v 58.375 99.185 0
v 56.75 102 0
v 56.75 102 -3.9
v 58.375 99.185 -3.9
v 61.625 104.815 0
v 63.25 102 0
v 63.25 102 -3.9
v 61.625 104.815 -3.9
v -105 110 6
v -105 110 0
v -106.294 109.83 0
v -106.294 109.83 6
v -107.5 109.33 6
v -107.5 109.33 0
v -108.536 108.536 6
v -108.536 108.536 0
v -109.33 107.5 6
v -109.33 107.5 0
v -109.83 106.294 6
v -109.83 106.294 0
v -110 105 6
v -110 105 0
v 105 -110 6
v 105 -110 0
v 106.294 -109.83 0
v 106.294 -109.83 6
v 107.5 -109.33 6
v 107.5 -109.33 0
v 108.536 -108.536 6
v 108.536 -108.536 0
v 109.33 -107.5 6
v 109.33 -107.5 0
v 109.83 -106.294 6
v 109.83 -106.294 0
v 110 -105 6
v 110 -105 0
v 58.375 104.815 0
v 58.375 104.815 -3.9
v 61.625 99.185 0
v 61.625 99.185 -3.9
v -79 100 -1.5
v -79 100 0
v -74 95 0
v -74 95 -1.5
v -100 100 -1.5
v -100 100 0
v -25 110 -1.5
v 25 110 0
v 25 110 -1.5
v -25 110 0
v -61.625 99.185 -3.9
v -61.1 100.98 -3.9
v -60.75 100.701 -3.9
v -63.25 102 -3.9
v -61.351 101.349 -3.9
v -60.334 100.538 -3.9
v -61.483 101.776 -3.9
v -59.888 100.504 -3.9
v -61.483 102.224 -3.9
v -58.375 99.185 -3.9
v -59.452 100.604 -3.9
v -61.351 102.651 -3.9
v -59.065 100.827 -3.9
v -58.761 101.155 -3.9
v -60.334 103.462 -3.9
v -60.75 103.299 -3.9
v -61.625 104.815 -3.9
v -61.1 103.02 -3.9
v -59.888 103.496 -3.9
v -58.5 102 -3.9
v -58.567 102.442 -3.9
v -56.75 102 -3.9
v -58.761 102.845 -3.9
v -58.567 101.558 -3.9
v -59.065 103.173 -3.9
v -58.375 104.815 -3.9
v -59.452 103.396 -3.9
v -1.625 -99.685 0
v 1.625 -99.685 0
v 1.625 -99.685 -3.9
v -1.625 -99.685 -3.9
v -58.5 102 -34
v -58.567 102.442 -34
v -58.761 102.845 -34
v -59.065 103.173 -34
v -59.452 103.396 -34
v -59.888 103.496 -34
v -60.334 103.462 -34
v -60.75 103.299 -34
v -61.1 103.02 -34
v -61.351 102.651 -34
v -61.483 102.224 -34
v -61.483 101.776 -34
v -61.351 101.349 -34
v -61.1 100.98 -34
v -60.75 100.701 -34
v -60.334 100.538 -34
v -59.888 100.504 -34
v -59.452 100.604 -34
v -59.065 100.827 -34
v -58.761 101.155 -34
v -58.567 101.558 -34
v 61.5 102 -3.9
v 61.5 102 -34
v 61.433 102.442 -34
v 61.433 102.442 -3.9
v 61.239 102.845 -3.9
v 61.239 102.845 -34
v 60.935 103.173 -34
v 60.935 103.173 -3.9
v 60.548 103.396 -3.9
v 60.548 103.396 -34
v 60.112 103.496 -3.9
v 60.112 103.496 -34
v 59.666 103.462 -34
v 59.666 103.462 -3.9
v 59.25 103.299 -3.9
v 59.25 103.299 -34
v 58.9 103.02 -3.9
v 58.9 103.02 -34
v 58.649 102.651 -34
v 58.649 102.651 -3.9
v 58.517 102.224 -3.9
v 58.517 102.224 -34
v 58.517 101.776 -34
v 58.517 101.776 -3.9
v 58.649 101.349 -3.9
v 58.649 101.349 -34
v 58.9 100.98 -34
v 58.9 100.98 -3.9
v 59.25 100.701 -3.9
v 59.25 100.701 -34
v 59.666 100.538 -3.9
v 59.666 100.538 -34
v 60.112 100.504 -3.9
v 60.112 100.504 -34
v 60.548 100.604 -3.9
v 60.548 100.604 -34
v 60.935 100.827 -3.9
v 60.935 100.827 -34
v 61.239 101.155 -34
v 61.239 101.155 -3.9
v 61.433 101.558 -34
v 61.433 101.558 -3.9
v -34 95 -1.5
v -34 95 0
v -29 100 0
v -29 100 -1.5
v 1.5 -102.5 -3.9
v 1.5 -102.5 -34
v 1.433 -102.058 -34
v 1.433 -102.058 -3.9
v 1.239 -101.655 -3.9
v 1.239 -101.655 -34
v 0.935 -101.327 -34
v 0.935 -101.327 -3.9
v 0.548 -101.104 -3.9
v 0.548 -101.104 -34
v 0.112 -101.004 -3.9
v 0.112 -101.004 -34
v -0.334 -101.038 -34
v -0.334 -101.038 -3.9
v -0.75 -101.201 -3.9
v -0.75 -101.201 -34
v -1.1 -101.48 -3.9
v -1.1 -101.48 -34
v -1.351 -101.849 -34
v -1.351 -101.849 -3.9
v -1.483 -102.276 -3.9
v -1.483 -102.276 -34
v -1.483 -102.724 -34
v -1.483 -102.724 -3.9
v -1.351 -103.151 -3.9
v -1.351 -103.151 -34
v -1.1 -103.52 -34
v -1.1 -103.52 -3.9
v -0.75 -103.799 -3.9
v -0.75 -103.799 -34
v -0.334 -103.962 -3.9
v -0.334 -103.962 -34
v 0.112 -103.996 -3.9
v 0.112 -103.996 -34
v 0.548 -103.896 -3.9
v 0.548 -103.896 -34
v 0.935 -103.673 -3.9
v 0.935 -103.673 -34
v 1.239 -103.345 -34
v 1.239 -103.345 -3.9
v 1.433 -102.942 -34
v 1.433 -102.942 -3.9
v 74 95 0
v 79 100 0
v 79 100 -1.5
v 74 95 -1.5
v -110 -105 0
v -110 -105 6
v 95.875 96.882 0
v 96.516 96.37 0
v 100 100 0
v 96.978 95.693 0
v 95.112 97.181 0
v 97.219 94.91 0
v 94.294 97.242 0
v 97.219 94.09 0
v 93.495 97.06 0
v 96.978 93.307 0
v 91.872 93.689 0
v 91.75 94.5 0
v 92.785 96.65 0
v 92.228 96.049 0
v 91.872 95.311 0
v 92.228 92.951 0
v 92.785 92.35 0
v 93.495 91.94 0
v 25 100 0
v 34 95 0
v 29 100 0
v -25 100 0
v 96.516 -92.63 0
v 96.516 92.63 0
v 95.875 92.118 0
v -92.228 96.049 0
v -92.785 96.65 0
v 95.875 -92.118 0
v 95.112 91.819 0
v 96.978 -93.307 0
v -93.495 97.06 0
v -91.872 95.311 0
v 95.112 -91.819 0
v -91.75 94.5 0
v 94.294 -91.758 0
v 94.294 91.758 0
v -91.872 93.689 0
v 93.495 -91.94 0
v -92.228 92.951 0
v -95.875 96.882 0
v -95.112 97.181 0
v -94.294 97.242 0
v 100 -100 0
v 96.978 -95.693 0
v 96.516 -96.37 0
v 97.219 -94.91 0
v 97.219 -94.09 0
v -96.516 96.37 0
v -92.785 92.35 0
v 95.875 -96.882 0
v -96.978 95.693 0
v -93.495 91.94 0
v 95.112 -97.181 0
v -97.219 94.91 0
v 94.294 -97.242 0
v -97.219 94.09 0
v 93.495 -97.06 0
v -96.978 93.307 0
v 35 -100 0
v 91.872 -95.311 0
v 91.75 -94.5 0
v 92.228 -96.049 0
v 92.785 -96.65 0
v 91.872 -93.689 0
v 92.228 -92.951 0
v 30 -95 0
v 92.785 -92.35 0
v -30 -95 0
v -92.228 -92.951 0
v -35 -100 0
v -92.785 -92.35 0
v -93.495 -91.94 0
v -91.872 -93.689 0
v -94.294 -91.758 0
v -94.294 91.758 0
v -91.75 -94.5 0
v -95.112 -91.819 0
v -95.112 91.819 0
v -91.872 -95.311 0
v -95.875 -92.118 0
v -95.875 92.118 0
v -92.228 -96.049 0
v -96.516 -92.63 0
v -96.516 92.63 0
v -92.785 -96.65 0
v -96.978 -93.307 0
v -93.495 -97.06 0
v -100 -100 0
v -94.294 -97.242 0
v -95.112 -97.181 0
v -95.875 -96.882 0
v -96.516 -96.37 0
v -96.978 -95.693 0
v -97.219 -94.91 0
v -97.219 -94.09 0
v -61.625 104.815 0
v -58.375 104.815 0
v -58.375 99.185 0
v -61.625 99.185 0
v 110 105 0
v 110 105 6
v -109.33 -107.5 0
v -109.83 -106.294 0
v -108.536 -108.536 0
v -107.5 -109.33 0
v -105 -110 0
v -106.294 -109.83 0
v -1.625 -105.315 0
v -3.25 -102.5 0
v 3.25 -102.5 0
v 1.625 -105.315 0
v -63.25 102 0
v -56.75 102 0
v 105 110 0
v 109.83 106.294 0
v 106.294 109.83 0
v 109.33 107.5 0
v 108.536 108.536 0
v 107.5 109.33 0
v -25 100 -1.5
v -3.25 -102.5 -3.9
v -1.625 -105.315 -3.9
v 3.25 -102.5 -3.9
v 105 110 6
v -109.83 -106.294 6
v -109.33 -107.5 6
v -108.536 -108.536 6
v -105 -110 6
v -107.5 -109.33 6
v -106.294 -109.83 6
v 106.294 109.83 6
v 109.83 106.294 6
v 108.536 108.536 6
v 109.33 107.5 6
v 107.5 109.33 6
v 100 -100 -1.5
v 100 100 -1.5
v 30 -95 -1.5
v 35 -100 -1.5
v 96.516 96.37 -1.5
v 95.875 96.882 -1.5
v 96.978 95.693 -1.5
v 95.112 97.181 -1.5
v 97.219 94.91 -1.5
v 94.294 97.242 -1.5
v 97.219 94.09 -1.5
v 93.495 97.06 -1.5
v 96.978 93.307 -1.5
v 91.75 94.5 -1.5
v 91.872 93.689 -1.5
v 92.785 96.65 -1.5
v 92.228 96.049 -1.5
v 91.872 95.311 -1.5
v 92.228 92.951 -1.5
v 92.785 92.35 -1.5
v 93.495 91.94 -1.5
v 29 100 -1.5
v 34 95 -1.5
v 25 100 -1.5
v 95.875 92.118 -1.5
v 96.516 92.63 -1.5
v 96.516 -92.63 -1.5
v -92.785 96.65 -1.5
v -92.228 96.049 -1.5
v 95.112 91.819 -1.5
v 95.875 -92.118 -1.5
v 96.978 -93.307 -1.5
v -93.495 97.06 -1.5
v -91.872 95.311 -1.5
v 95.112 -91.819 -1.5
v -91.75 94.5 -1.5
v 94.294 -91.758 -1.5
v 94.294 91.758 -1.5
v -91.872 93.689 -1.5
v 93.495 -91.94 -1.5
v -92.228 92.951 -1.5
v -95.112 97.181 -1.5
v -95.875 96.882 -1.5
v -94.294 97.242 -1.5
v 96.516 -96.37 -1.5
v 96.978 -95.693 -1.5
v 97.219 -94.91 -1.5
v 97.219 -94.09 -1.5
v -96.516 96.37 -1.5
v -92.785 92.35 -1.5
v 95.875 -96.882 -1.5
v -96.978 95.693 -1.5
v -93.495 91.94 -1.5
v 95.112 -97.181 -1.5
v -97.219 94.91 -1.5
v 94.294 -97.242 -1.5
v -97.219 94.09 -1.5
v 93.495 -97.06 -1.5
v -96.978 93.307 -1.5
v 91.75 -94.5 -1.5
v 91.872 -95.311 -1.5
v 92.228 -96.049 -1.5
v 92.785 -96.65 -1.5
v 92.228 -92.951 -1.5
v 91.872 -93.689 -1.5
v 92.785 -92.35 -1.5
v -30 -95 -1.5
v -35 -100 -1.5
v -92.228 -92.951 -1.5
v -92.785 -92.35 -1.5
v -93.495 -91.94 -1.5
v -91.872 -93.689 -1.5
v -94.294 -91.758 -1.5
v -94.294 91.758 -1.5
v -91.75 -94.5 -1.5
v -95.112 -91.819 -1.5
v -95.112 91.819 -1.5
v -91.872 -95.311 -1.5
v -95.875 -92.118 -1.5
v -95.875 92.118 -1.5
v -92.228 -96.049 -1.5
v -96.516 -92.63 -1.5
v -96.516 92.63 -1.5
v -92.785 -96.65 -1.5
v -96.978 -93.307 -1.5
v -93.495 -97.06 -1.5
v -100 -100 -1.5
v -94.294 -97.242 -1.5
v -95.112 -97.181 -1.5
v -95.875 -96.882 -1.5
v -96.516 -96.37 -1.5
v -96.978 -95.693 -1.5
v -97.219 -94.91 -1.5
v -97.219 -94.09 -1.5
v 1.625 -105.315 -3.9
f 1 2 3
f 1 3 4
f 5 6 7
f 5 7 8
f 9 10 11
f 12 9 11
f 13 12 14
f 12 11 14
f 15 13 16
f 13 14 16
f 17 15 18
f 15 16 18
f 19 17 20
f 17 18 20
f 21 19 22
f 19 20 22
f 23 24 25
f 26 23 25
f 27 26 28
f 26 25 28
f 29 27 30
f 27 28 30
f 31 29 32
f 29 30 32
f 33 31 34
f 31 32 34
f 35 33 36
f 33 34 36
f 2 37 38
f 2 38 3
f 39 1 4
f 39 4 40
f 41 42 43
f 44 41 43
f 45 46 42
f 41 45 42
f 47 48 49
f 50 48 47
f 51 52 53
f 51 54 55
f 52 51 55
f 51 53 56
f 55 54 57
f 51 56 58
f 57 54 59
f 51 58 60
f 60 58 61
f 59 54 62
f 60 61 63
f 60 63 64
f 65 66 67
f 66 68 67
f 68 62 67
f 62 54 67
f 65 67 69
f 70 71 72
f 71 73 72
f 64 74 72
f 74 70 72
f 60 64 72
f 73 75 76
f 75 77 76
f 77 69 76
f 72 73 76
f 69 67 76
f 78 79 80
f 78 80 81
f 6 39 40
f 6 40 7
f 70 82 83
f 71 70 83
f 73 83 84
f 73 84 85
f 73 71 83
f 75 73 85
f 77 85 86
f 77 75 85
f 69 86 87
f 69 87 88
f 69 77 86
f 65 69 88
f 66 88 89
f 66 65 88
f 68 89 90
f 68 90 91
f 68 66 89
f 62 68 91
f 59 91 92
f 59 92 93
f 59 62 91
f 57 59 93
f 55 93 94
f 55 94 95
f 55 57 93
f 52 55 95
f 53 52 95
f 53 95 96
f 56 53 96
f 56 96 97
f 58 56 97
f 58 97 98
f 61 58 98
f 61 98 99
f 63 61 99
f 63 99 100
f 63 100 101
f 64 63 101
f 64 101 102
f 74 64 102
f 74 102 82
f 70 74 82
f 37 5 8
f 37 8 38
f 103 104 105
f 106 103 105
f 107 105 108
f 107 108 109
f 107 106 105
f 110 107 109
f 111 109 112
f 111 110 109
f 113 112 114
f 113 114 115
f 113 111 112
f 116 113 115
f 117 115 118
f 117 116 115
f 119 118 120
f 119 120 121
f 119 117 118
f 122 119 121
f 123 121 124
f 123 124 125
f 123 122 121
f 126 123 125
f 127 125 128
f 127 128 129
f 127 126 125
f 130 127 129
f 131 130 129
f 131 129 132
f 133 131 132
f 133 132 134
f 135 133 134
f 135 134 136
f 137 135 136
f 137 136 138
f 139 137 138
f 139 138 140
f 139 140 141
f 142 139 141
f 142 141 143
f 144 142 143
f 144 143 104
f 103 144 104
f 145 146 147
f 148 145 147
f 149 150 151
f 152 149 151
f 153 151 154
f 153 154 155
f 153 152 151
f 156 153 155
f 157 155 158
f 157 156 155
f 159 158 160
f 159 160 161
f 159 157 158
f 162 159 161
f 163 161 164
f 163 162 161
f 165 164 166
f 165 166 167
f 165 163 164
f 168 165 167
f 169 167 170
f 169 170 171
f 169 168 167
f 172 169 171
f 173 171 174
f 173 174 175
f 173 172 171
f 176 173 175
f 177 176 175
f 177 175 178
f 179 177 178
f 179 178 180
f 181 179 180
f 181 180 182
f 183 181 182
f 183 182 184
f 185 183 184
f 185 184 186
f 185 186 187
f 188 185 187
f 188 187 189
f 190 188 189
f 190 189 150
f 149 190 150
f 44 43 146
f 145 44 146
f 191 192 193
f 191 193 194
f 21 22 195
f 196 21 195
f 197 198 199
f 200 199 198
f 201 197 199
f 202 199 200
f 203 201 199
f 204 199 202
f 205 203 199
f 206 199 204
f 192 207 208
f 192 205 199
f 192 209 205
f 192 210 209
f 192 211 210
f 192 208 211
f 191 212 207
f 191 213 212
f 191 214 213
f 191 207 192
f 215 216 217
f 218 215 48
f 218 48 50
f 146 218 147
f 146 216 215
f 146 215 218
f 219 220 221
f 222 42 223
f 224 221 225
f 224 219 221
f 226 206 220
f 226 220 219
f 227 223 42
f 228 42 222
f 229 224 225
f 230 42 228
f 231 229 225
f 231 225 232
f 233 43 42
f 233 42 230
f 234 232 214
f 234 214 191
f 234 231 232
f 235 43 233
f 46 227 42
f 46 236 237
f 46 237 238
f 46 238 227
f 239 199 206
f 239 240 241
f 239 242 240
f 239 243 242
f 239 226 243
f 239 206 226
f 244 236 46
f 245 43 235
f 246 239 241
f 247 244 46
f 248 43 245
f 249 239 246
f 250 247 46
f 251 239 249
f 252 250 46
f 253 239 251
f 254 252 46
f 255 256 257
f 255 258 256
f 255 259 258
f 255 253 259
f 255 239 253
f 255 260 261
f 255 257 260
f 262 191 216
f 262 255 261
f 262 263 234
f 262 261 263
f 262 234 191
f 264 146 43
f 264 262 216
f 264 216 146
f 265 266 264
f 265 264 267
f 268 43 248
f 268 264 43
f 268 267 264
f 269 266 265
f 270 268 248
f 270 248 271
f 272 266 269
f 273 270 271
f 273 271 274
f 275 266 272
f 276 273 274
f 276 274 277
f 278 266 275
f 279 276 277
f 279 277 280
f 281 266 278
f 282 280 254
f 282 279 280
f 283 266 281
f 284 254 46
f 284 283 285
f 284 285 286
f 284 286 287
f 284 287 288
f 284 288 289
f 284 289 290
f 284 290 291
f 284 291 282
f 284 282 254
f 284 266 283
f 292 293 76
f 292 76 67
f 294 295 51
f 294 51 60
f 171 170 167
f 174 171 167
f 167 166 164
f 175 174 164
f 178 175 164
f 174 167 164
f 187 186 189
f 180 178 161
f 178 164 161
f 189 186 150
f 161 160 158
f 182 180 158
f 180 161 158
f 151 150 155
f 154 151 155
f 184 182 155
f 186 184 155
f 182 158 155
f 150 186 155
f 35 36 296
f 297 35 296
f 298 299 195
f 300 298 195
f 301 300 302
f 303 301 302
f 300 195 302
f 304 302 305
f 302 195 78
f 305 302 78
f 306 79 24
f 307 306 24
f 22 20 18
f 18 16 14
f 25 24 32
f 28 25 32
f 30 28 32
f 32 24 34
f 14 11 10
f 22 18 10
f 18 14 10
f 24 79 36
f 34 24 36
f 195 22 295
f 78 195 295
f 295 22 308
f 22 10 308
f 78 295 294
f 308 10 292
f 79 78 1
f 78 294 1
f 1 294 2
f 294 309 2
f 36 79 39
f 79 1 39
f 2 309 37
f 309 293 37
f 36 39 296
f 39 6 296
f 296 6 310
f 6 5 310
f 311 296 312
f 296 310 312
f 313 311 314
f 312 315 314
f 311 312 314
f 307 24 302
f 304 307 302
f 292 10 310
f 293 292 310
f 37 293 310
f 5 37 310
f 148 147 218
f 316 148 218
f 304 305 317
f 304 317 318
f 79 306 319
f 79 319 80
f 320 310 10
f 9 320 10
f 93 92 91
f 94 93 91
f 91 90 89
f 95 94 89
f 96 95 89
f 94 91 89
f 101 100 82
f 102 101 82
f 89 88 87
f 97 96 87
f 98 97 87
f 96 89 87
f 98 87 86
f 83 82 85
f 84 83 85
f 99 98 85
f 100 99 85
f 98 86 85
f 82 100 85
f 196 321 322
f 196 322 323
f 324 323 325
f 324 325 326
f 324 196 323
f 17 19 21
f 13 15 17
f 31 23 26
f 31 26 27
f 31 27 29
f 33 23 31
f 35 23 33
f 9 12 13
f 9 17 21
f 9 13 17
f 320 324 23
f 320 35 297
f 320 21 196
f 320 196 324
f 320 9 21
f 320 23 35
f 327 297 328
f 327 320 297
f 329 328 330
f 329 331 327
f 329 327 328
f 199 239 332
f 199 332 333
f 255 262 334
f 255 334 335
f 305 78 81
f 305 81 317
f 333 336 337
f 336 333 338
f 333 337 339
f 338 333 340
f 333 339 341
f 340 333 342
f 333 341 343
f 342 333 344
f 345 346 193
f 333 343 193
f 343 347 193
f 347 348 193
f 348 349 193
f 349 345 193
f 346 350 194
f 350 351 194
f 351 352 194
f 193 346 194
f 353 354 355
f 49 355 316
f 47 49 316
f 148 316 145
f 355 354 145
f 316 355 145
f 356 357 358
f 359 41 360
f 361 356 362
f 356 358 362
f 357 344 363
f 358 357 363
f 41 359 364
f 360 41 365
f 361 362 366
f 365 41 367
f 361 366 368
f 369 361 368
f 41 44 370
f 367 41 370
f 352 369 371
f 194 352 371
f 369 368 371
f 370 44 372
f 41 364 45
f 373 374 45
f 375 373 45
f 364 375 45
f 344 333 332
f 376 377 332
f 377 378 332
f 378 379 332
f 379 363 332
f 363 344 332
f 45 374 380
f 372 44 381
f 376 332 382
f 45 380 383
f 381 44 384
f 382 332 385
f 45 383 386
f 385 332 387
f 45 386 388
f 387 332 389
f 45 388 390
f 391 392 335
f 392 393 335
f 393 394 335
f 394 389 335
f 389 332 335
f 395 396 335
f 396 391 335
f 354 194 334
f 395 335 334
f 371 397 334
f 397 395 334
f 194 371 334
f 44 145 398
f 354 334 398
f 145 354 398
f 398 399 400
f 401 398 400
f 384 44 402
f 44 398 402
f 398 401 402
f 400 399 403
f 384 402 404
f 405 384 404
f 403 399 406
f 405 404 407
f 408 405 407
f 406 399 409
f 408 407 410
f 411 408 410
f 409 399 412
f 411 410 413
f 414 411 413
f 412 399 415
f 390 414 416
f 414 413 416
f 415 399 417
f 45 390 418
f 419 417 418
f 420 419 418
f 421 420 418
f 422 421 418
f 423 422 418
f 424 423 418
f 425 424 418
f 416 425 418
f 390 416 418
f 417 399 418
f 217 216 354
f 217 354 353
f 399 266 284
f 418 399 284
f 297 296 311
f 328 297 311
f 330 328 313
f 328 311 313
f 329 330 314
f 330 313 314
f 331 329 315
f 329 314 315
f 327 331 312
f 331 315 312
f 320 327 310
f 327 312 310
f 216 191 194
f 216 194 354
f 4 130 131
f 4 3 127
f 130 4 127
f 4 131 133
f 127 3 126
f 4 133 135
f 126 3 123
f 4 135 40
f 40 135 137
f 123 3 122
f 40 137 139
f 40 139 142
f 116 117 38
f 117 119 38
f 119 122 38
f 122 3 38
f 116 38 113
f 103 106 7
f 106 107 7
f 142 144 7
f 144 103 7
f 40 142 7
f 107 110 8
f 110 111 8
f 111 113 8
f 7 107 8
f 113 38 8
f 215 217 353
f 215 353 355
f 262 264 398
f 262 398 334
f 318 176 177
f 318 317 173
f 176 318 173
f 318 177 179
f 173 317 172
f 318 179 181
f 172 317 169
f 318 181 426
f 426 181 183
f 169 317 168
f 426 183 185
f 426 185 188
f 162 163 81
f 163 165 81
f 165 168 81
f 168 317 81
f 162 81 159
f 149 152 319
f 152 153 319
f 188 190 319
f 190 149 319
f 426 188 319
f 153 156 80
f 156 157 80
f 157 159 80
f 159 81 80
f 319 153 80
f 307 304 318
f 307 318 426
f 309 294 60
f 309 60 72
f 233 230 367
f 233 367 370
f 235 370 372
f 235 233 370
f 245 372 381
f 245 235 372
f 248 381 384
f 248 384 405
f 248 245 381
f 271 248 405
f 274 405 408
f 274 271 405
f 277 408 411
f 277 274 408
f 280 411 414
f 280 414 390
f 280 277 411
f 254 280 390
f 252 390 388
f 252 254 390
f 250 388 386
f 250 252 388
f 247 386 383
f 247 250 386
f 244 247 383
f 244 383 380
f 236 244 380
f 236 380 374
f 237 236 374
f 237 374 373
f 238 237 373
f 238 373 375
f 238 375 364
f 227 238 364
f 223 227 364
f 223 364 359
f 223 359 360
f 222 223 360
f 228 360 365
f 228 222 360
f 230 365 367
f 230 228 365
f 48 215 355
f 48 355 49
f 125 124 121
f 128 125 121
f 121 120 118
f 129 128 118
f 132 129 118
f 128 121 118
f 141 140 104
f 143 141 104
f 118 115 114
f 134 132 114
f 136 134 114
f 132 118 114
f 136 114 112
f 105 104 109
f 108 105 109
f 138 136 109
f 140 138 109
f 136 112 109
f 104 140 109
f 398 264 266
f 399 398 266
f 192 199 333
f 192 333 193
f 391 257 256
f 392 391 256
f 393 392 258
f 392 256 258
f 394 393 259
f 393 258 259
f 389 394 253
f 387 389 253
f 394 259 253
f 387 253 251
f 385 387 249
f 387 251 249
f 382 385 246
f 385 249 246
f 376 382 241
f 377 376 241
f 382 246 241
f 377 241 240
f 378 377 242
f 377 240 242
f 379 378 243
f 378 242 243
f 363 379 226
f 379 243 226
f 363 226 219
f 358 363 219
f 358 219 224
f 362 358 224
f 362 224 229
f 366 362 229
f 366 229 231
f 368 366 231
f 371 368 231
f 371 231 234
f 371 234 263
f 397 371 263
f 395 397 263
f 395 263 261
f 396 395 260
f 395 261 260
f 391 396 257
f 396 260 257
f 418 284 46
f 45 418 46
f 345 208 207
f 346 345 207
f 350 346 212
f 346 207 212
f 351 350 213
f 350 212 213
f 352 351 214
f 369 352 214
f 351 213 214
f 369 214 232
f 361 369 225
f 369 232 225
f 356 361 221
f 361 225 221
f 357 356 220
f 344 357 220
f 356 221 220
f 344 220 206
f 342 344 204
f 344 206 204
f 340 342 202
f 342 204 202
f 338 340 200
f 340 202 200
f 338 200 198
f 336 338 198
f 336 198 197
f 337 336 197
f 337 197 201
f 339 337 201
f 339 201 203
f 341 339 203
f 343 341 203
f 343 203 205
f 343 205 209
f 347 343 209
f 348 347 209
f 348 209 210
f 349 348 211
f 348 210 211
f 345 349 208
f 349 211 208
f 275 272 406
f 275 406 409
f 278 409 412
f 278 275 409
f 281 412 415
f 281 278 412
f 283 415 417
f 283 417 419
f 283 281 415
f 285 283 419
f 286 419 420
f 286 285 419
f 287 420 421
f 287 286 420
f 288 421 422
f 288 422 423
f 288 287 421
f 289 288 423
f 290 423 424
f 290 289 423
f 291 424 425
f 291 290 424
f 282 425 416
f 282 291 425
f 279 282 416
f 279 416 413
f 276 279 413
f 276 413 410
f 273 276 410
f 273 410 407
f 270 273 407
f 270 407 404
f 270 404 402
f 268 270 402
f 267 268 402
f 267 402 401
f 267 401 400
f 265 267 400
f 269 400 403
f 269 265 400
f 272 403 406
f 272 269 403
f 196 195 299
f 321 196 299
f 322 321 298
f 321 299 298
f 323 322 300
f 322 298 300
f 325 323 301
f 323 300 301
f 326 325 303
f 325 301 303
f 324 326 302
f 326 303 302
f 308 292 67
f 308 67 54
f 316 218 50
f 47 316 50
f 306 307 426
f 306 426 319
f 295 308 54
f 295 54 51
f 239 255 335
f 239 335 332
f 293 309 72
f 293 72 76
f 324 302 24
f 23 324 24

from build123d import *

# Parameters (mm, degrees)
F1_DEPTH = 6
F2_R     = 1.5
F3_DEPTH = 34
F5_DEPTH = 3.9
F6_R     = 2.75
F7_DEPTH = 1.5


with BuildPart() as f1:
    # F0 (on Top) → F1 (new body)
    with BuildSketch(Plane.XY):
        with BuildLine():
            Line((-105, -110), (105, -110))
            ThreePointArc((105, -110), (108.5355339059, -108.5355339059), (110, -105))
            Line((110, -105), (110, 105))
            ThreePointArc((110, 105), (108.5355339059, 108.5355339059), (105, 110))
            Line((105, 110), (-105, 110))
            ThreePointArc((-105, 110), (-108.5355339059, 108.5355339059), (-110, 105))
            Line((-110, 105), (-110, -105))
            ThreePointArc((-110, -105), (-108.5355339059, -108.5355339059), (-105, -110))
        make_face()
    extrude(amount=F1_DEPTH)

    # F2 (on Top) → F3 (join)
    with BuildSketch(Plane.XY):
        with Locations((0, -102.5)):
            Circle(F2_R)
        with Locations((-60, 102)):
            Circle(F2_R)
        with Locations((60, 102)):
            Circle(F2_R)
    extrude(amount=-F3_DEPTH)

    # F4 (on Top) → F5 (join)
    with BuildSketch(Plane.XY):
        Polygon((-1.625, -105.3145825623), (1.625, -105.3145825623), (3.25, -102.5), (1.625, -99.6854174377), (-1.625, -99.6854174377), (-3.25, -102.5), align=None)
        Polygon((58.375, 104.8145825623), (56.75, 102), (58.375, 99.1854174377), (61.625, 99.1854174377), (63.25, 102), (61.625, 104.8145825623), align=None)
        Polygon((-58.375, 104.8145825623), (-61.625, 104.8145825623), (-63.25, 102), (-61.625, 99.1854174377), (-58.375, 99.1854174377), (-56.75, 102), align=None)
    extrude(amount=-F5_DEPTH)


with BuildPart() as f7:
    # F6 (on face) → F7 (new body)
    with BuildSketch(Plane(origin=(0, 0, 0), x_dir=(1, 0, 0), z_dir=(0, 0, -1))):
        Polygon((-35, 100), (-100, 100), (-100, -100), (-79, -100), (-74, -95), (-34, -95), (-29, -100), (-25, -100), (-25, -110), (0, -110), (0, 95), (-30, 95), align=None)
        with Locations((-94.5, -94.5)):
            Circle(F6_R, mode=Mode.SUBTRACT)
        with Locations((-94.5, 94.5)):
            Circle(F6_R, mode=Mode.SUBTRACT)
    extrude(amount=F7_DEPTH)

    # F8: F7 across plane


with BuildPart() as f7_1:
    add(f7.part)
    add(f7.part.mirror(Plane.YZ))


solid = Compound([f1.part, f7_1.part])
